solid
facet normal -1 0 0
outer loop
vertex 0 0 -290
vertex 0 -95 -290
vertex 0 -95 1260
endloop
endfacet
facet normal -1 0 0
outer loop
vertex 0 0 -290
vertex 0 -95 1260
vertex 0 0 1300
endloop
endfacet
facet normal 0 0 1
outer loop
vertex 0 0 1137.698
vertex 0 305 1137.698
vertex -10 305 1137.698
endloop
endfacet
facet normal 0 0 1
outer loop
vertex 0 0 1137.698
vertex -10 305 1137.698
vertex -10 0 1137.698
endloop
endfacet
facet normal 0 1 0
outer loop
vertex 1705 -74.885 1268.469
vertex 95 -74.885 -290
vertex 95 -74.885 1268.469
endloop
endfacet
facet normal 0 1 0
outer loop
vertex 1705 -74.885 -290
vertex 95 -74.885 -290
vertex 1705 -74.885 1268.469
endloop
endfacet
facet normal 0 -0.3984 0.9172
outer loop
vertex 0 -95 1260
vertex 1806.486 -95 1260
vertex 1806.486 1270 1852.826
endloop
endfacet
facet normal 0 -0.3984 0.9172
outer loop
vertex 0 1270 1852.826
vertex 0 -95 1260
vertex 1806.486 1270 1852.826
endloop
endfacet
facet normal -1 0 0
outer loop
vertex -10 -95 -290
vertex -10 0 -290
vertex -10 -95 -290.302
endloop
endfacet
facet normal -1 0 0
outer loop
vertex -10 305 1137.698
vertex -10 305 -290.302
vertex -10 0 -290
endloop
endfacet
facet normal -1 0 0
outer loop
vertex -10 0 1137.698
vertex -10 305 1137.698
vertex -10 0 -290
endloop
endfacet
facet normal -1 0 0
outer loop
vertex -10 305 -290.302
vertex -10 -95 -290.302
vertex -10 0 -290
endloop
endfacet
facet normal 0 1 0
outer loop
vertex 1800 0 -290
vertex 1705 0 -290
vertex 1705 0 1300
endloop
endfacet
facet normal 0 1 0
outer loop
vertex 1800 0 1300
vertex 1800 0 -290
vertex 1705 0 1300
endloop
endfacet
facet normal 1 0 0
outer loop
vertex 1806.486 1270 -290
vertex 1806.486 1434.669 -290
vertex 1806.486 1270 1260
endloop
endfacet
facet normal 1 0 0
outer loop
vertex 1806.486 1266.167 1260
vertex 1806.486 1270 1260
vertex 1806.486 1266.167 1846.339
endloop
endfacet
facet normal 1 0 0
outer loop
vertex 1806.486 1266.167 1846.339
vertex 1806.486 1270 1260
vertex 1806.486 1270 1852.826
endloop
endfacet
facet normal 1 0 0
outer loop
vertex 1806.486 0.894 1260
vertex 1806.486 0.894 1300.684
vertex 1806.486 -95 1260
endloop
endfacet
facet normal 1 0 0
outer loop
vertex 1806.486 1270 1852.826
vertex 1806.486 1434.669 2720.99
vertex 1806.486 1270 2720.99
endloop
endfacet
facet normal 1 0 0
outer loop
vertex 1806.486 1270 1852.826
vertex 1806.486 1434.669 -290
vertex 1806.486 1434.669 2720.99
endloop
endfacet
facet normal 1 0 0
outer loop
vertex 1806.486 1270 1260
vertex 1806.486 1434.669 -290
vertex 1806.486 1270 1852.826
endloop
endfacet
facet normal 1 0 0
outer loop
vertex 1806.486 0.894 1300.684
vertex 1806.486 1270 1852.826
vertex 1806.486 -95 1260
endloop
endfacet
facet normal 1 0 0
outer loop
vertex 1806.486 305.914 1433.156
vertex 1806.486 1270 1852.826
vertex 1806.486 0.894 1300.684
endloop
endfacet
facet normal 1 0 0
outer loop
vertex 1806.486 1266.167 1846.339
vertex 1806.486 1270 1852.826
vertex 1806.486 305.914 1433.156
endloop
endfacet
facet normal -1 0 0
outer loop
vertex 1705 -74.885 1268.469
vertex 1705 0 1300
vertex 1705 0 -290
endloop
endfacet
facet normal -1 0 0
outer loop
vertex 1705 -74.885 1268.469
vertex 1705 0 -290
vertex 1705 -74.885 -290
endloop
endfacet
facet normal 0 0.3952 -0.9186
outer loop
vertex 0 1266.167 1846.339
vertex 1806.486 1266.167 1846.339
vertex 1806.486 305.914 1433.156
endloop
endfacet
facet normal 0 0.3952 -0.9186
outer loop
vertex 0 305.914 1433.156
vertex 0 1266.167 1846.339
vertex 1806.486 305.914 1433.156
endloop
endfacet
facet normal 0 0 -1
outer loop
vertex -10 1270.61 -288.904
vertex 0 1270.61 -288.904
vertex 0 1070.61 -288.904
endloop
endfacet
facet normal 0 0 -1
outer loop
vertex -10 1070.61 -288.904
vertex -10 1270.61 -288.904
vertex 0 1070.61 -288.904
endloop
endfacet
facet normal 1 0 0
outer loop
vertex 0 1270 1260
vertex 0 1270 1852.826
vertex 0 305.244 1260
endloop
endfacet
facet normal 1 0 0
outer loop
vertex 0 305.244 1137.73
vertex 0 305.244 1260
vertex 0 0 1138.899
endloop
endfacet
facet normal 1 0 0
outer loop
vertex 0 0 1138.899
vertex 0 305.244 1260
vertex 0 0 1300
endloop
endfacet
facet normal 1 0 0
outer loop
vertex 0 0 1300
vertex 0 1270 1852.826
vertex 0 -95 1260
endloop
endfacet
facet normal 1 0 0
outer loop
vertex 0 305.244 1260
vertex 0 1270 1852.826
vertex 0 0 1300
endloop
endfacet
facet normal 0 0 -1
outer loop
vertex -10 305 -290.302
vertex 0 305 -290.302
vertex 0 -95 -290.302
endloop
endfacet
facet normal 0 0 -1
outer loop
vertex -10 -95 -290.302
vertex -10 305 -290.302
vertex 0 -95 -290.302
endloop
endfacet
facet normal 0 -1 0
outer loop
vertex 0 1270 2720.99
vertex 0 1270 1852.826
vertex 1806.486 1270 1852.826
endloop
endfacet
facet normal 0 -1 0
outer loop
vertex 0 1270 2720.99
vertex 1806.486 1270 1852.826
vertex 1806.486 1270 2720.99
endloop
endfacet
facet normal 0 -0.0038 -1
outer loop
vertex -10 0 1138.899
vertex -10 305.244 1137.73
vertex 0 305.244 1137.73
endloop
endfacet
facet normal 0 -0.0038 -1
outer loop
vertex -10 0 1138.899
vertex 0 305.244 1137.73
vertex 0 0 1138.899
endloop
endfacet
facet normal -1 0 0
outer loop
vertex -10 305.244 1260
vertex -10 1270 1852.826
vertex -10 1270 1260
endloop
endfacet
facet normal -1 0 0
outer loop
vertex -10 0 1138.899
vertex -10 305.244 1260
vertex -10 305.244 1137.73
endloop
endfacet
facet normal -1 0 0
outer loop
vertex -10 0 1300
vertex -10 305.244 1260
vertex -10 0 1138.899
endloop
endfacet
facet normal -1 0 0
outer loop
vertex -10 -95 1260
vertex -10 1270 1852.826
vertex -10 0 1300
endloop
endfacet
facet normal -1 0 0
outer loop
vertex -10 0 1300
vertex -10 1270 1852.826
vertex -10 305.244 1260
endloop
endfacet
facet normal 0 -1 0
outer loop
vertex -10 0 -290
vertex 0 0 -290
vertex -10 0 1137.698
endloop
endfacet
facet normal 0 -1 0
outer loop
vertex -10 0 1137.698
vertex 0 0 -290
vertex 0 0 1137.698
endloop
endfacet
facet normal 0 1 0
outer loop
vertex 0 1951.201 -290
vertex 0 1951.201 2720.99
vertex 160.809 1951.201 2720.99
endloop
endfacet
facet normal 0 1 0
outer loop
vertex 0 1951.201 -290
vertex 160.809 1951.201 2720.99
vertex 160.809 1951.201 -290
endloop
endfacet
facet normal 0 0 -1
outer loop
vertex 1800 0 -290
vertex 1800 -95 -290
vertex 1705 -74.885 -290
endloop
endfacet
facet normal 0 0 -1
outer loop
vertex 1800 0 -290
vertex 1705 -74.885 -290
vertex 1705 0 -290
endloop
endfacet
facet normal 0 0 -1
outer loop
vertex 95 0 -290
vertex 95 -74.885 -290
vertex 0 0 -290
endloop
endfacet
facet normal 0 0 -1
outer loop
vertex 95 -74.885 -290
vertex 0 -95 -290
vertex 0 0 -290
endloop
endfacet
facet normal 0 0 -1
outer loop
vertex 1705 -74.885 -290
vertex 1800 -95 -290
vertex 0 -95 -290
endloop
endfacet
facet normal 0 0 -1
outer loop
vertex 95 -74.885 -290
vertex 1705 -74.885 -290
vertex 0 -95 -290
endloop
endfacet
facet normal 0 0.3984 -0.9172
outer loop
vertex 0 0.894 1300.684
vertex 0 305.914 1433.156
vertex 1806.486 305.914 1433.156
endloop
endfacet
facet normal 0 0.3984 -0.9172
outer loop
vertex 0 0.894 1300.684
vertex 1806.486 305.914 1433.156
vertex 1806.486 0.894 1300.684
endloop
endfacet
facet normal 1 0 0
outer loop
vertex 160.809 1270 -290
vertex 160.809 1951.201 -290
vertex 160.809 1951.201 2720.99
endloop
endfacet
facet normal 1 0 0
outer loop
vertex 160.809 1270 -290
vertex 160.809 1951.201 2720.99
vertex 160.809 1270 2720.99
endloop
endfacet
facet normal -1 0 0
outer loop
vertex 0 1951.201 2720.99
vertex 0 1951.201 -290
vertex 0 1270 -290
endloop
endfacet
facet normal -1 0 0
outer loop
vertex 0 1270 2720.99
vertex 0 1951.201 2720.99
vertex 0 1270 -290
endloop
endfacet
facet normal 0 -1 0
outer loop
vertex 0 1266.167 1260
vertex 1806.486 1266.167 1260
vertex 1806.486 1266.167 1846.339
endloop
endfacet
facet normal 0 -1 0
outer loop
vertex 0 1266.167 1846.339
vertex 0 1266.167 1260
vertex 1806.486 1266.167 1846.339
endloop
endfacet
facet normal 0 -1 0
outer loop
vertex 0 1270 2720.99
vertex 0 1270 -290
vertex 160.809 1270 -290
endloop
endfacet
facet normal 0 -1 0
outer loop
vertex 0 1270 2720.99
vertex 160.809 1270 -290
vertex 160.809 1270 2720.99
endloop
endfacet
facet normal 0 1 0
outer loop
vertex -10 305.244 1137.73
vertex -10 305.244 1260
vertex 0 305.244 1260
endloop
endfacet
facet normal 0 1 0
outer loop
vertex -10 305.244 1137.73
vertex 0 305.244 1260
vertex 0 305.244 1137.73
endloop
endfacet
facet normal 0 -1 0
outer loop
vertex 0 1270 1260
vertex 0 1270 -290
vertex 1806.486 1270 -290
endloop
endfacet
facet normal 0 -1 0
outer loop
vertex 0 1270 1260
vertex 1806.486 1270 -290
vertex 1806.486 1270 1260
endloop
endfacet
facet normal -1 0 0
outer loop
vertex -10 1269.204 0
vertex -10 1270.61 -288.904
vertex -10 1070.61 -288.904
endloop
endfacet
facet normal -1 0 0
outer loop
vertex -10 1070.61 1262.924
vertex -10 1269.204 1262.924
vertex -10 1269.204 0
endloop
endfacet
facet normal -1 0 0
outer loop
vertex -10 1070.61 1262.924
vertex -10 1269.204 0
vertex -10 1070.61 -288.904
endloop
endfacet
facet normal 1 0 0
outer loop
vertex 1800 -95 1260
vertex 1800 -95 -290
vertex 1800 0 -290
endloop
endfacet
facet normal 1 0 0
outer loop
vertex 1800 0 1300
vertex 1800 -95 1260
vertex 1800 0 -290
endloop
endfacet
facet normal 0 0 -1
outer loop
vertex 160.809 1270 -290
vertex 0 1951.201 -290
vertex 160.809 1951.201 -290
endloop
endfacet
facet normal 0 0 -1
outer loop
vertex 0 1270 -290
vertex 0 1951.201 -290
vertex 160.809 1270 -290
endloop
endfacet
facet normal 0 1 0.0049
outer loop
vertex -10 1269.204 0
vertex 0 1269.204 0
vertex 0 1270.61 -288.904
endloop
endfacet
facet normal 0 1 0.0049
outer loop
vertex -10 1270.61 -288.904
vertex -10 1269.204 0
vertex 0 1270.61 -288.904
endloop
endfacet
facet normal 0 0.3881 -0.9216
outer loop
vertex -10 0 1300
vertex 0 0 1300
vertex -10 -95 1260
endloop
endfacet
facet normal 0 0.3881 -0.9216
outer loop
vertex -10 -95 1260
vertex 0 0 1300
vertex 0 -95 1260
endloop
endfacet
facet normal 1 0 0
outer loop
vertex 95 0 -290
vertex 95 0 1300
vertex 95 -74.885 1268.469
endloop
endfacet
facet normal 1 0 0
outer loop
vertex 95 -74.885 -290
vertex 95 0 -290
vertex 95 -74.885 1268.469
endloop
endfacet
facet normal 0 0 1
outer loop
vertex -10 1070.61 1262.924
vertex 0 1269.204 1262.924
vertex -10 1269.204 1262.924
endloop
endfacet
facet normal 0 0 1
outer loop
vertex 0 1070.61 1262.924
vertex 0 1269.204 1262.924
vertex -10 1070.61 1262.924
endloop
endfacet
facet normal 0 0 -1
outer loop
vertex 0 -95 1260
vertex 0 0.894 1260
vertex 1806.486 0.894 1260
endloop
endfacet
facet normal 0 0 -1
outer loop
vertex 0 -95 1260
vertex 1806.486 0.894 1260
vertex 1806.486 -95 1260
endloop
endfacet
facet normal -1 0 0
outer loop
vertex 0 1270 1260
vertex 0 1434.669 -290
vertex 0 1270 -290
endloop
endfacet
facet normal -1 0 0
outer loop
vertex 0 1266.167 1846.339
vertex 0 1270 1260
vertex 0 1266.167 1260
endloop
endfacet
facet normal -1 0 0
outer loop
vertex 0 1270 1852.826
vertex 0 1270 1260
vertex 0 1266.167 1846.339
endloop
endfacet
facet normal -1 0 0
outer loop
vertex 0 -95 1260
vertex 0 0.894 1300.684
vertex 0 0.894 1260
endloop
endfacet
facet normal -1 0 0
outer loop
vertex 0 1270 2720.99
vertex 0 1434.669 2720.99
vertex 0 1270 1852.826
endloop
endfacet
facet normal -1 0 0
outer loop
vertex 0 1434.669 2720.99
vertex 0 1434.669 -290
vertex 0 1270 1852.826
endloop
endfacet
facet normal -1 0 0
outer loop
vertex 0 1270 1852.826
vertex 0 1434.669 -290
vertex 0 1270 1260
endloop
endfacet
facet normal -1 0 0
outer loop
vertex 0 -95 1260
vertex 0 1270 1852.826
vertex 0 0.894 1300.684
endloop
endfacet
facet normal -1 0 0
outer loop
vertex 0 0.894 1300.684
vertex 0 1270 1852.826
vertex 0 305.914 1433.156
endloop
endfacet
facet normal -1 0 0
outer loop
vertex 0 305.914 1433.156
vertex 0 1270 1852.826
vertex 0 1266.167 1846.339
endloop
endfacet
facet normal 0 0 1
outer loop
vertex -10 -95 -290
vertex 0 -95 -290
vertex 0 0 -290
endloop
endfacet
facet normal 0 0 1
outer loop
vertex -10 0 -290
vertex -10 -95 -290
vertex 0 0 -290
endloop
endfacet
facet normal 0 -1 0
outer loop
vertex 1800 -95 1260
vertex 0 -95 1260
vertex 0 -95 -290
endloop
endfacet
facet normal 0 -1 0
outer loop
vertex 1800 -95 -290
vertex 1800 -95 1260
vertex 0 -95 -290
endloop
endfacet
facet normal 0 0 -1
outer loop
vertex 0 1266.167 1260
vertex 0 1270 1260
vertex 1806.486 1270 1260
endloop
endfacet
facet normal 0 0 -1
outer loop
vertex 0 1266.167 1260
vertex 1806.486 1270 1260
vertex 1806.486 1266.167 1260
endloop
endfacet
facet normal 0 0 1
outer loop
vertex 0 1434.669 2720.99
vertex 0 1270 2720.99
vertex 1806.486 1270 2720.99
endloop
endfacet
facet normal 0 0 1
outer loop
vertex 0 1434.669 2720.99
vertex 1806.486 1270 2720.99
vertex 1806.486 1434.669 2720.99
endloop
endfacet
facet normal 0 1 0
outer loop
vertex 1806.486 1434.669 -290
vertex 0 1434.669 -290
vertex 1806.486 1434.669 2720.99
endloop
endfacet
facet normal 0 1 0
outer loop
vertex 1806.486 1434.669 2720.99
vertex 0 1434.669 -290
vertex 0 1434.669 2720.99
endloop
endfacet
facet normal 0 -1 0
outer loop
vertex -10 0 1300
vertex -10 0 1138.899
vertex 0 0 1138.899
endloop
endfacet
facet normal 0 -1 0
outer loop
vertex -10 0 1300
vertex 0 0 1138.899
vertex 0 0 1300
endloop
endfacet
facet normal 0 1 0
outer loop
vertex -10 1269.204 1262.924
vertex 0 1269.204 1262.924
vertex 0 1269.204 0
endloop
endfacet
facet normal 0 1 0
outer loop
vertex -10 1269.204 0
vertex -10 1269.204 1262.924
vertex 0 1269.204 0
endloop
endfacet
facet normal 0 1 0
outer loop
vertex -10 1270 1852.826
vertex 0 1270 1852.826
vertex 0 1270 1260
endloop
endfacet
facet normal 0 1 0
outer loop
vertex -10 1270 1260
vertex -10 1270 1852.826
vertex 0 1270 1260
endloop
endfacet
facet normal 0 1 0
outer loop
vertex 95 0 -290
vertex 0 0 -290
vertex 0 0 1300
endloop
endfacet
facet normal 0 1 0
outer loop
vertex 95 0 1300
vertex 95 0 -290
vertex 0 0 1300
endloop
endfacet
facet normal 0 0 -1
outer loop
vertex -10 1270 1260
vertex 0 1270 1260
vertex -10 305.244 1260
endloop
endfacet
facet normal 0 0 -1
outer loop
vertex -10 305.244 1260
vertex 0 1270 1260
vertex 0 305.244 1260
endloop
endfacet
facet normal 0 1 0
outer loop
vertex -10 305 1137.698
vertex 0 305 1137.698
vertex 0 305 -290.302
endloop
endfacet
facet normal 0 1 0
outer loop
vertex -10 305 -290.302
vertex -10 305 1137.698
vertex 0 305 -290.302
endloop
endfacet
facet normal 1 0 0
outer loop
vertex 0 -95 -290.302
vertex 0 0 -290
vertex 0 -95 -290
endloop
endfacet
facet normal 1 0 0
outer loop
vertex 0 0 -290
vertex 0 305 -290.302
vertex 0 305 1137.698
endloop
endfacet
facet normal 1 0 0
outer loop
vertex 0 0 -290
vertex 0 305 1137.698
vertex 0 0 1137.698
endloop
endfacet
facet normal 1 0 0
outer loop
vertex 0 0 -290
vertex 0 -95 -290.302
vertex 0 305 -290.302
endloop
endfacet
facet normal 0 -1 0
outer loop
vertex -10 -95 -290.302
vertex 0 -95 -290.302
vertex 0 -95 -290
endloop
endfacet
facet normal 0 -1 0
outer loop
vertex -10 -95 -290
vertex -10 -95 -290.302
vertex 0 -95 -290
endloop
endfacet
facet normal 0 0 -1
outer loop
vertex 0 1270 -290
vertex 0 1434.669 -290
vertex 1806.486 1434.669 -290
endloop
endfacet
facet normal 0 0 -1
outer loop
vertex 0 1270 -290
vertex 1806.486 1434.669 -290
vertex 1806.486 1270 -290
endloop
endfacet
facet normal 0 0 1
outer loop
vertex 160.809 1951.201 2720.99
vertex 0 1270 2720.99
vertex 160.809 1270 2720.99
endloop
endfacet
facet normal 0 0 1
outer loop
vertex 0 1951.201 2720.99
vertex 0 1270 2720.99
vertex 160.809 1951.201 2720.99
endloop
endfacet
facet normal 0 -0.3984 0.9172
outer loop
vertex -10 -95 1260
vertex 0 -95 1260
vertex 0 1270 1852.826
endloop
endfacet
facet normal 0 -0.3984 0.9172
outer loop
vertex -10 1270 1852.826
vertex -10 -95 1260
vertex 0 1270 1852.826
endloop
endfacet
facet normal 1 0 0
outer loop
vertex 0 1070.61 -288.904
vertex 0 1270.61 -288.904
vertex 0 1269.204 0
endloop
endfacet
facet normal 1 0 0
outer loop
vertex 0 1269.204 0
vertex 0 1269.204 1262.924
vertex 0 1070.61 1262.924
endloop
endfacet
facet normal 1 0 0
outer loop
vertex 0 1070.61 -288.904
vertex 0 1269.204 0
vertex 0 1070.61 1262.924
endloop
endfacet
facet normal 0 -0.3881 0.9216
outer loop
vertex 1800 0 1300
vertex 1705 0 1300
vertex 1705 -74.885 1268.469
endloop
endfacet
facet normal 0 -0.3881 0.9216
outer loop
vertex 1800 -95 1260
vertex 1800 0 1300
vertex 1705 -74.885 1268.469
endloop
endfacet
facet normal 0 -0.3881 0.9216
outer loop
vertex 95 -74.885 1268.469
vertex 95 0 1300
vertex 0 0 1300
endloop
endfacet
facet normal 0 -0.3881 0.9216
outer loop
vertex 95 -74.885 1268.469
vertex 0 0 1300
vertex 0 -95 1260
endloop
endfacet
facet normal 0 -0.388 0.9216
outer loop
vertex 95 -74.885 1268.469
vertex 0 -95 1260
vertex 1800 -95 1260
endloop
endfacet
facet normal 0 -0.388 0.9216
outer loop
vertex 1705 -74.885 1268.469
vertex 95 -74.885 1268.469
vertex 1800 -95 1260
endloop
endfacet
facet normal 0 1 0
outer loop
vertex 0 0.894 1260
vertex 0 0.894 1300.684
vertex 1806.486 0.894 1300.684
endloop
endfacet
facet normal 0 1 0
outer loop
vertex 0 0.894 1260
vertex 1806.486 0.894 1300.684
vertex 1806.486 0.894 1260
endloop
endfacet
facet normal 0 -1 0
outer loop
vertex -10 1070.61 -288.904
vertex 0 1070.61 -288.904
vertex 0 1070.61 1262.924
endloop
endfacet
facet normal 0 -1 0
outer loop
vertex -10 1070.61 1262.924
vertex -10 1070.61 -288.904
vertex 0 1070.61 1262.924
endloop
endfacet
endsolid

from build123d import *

# Parameters (mm, degrees)
F1_DEPTH  = 1800
F4_DEPTH  = 10
F3_W      = 198.5935460704
F3_H      = 125.2263307571
F3_H_2    = 119
F3_W_2    = 305
F6_DEPTH  = 10
F7_DEPTH  = 1806.4861297607
F9_DEPTH  = 2295.1808217913
F11_DEPTH = 1985.6109861284
F12_W     = 719.2032337189
F12_H     = 3839.0393257141
F13_DEPTH = 2175.1913074404
F14_DEPTH = 160.8089450747
F15_W     = 1610
F15_H     = 74.8850554228
F16_DEPTH = 2483.9819669724


with BuildPart() as f1:
    # F0 (on Right) → F1 (new body)
    with BuildSketch(Plane.YZ):
        Polygon((-95, -290.000010696), (0, -290.000010696), (0, 1299.999989304), (-95, 1259.999989304), align=None)
    extrude(amount=F1_DEPTH)

    # F15 (on face) → F16 (cut)
    with BuildSketch(Plane(origin=(0, 0, -290.000010696), x_dir=(1, 0, 0), z_dir=(0, 0, -1))):
        with Locations((900, 37.4425277114)):
            Rectangle(F15_W, F15_H)
    extrude(amount=-F16_DEPTH, mode=Mode.SUBTRACT)


with BuildPart() as f4:
    # F2 (on face) → F4 (new body)
    with BuildSketch(Plane(origin=(0, 0, 0), x_dir=(0, -1, 0), z_dir=(-1, 0, 0))):
        Polygon((-1270, 1852.8258800507), (-1270, 1259.999989304), (0, 1259.999989304), (0, 1299.999989304), (95, 1259.999989304), align=None)
    extrude(amount=F4_DEPTH)

    # F5 (on face) → F6 (join)
    with BuildSketch(Plane(origin=(-10, 0, 0), x_dir=(0, -1, 0), z_dir=(-1, 0, 0))):
        Polygon((-305.2440285683, 1259.999989304), (-305.2440285683, 1137.7295255661), (0, 1138.8988494873), (0, 1259.999989304), align=None)
    extrude(amount=-F6_DEPTH)


with BuildPart() as f4b:
    # F3 (on face) → F4, piece 2 (new body)
    with BuildSketch(Plane(origin=(0, 0, 0), x_dir=(0, -1, 0), z_dir=(-1, 0, 0))):
        with Locations((-1169.9069863149, 1200.3113059998)):
            Rectangle(F3_W, F3_H)
        with Locations((-1169.9069863149, 840.1981406212)):
            Rectangle(F3_W, F3_H_2)
        with Locations((-1169.9069863149, 1078.1981406212)):
            Rectangle(F3_W, F3_H_2)
        with Locations((-1169.9069863149, 959.1981406212)):
            Rectangle(F3_W, F3_H_2)
        with Locations((-1169.9069863149, 602.1981406212)):
            Rectangle(F3_W, F3_H_2)
        with Locations((-1169.9069863149, 721.1981406212)):
            Rectangle(F3_W, F3_H_2)
        with Locations((-1169.9069863149, 483.1981406212)):
            Rectangle(F3_W, F3_H_2)
        with Locations((-1169.9069863149, 364.1981406212)):
            Rectangle(F3_W, F3_H_2)
        with Locations((-1169.9069863149, 245.1981406212)):
            Rectangle(F3_W, F3_H_2)
        with Locations((-1169.9069863149, 126.1981406212)):
            Rectangle(F3_W, F3_H_2)
        Polygon((-1070.6102132797, 66.6981406212), (-1269.2037593501, 66.6981406212), (-1269.2037593501, 0), (-1269.4583772772, -52.3018593788), (-1070.6102132797, -52.3018593788), align=None)
        Polygon((-1070.6102132797, -171.3018593788), (-1070.6102132797, -52.3018593788), (-1269.4583772772, -52.3018593788), (-1270.0376976624, -171.3018593788), align=None)
        Polygon((-1070.6102132797, -288.9040708542), (-1070.6102132797, -171.3018593788), (-1270.0376976624, -171.3018593788), (-1270.6102132797, -288.9040708542), align=None)
    extrude(amount=F4_DEPTH)


with BuildPart() as f4c:
    # F3 (on face) → F4, piece 3 (new body)
    with BuildSketch(Plane(origin=(0, 0, 0), x_dir=(0, -1, 0), z_dir=(-1, 0, 0))):
        Polygon((0, -171.3018593788), (-305, -171.3018593788), (-305, -290.3018593788), (95, -290.3018593788), (95, -290.000010696), (0, -290.000010696), align=None)
        with Locations((-152.5, -111.8018593788)):
            Rectangle(F3_W_2, F3_H_2)
        with Locations((-152.5, 7.1981406212)):
            Rectangle(F3_W_2, F3_H_2)
        with Locations((-152.5, 126.1981406212)):
            Rectangle(F3_W_2, F3_H_2)
        with Locations((-152.5, 245.1981406212)):
            Rectangle(F3_W_2, F3_H_2)
        with Locations((-152.5, 364.1981406212)):
            Rectangle(F3_W_2, F3_H_2)
        with Locations((-152.5, 483.1981406212)):
            Rectangle(F3_W_2, F3_H_2)
        with Locations((-152.5, 602.1981406212)):
            Rectangle(F3_W_2, F3_H_2)
        with Locations((-152.5, 840.1981406212)):
            Rectangle(F3_W_2, F3_H_2)
        with Locations((-152.5, 959.1981406212)):
            Rectangle(F3_W_2, F3_H_2)
        with Locations((-152.5, 721.1981406212)):
            Rectangle(F3_W_2, F3_H_2)
        with Locations((-152.5, 1078.1981406212)):
            Rectangle(F3_W_2, F3_H_2)
    extrude(amount=F4_DEPTH)


with BuildPart() as f7:
    # F2 (on face) → F7 (new body)
    with BuildSketch(Plane(origin=(0, 0, 0), x_dir=(0, -1, 0), z_dir=(-1, 0, 0))):
        Polygon((-1951.2008428574, -290.000010696), (-1270, -290.000010696), (-1270, 1259.999989304), (-1270, 1852.8258800507), (-1270, 2720.9904193878), (-1951.2008428574, 2720.9904193878), align=None)
        Polygon((-1270, 1852.8258800507), (-1270, 1259.999989304), (0, 1259.999989304), (95, 1259.999989304), align=None)
    extrude(amount=-F7_DEPTH)

    # F8 (on face) → F9 (cut)
    with BuildSketch(Plane.YZ.offset(1806.4861297607)):
        Polygon((305.9136271477, 1261.8664503098), (305.9136271477, 1258.1008672714), (379.9477815628, 1258.1008672714), (522.2533345222, 1258.1008672714), (570.3758001328, 1258.1008672714), (747.250020504, 1258.1008672714), (916.7550802231, 1258.1008672714), (1097.1890687943, 1258.1008672714), (1266.1670446396, 1258.1008672714), (1266.1670446396, 1261.8664503098), (1266.1670446396, 1289.4487380981), (1266.1670446396, 1648.1994390488), (1266.1670446396, 1803.9075136185), (1266.1670446396, 1846.3387489319), (305.9136271477, 1433.1557750702), align=None)
        Polygon((305.9136271477, 1261.8664503098), (305.9136271477, 1259.999989304), (1266.1670446396, 1259.999989304), (1266.1670446396, 1261.8664503098), (1266.1670446396, 1289.4487380981), (1266.1670446396, 1648.1994390488), (1266.1670446396, 1803.9075136185), (1266.1670446396, 1846.3387489319), (305.9136271477, 1433.1557750702), align=None)
    extrude(amount=-F9_DEPTH, mode=Mode.SUBTRACT)

    # F10 (on face) → F11 (cut)
    with BuildSketch(Plane.YZ.offset(1806.4861297607)):
        Polygon((305.9136271477, 1259.999989304), (305.9136271477, 1433.1557750702), (202.2104150255, 1388.116984521), (8.5436779362, 1304.0066138815), (0.8936976359, 1300.6841916209), (0.8936976359, 1259.999989304), align=None)
    extrude(amount=-F11_DEPTH, mode=Mode.SUBTRACT)

    # F12 (on face) → F13 (cut)
    with BuildSketch(Plane(origin=(0, 0, 0), x_dir=(0, -1, 0), z_dir=(-1, 0, 0))):
        with Locations((-1794.2711114883, 1262.0453834534)):
            Rectangle(F12_W, F12_H)
    extrude(amount=-F13_DEPTH, mode=Mode.SUBTRACT)


with BuildPart() as f14:
    # F2 (on face) → F14 (new body)
    with BuildSketch(Plane(origin=(0, 0, 0), x_dir=(0, -1, 0), z_dir=(-1, 0, 0))):
        Polygon((-1951.2008428574, -290.000010696), (-1270, -290.000010696), (-1270, 1259.999989304), (-1270, 1852.8258800507), (-1270, 2720.9904193878), (-1951.2008428574, 2720.9904193878), align=None)
    extrude(amount=-F14_DEPTH)


solid = Compound([f1.part, f4.part, f4b.part, f4c.part, f7.part, f14.part])
